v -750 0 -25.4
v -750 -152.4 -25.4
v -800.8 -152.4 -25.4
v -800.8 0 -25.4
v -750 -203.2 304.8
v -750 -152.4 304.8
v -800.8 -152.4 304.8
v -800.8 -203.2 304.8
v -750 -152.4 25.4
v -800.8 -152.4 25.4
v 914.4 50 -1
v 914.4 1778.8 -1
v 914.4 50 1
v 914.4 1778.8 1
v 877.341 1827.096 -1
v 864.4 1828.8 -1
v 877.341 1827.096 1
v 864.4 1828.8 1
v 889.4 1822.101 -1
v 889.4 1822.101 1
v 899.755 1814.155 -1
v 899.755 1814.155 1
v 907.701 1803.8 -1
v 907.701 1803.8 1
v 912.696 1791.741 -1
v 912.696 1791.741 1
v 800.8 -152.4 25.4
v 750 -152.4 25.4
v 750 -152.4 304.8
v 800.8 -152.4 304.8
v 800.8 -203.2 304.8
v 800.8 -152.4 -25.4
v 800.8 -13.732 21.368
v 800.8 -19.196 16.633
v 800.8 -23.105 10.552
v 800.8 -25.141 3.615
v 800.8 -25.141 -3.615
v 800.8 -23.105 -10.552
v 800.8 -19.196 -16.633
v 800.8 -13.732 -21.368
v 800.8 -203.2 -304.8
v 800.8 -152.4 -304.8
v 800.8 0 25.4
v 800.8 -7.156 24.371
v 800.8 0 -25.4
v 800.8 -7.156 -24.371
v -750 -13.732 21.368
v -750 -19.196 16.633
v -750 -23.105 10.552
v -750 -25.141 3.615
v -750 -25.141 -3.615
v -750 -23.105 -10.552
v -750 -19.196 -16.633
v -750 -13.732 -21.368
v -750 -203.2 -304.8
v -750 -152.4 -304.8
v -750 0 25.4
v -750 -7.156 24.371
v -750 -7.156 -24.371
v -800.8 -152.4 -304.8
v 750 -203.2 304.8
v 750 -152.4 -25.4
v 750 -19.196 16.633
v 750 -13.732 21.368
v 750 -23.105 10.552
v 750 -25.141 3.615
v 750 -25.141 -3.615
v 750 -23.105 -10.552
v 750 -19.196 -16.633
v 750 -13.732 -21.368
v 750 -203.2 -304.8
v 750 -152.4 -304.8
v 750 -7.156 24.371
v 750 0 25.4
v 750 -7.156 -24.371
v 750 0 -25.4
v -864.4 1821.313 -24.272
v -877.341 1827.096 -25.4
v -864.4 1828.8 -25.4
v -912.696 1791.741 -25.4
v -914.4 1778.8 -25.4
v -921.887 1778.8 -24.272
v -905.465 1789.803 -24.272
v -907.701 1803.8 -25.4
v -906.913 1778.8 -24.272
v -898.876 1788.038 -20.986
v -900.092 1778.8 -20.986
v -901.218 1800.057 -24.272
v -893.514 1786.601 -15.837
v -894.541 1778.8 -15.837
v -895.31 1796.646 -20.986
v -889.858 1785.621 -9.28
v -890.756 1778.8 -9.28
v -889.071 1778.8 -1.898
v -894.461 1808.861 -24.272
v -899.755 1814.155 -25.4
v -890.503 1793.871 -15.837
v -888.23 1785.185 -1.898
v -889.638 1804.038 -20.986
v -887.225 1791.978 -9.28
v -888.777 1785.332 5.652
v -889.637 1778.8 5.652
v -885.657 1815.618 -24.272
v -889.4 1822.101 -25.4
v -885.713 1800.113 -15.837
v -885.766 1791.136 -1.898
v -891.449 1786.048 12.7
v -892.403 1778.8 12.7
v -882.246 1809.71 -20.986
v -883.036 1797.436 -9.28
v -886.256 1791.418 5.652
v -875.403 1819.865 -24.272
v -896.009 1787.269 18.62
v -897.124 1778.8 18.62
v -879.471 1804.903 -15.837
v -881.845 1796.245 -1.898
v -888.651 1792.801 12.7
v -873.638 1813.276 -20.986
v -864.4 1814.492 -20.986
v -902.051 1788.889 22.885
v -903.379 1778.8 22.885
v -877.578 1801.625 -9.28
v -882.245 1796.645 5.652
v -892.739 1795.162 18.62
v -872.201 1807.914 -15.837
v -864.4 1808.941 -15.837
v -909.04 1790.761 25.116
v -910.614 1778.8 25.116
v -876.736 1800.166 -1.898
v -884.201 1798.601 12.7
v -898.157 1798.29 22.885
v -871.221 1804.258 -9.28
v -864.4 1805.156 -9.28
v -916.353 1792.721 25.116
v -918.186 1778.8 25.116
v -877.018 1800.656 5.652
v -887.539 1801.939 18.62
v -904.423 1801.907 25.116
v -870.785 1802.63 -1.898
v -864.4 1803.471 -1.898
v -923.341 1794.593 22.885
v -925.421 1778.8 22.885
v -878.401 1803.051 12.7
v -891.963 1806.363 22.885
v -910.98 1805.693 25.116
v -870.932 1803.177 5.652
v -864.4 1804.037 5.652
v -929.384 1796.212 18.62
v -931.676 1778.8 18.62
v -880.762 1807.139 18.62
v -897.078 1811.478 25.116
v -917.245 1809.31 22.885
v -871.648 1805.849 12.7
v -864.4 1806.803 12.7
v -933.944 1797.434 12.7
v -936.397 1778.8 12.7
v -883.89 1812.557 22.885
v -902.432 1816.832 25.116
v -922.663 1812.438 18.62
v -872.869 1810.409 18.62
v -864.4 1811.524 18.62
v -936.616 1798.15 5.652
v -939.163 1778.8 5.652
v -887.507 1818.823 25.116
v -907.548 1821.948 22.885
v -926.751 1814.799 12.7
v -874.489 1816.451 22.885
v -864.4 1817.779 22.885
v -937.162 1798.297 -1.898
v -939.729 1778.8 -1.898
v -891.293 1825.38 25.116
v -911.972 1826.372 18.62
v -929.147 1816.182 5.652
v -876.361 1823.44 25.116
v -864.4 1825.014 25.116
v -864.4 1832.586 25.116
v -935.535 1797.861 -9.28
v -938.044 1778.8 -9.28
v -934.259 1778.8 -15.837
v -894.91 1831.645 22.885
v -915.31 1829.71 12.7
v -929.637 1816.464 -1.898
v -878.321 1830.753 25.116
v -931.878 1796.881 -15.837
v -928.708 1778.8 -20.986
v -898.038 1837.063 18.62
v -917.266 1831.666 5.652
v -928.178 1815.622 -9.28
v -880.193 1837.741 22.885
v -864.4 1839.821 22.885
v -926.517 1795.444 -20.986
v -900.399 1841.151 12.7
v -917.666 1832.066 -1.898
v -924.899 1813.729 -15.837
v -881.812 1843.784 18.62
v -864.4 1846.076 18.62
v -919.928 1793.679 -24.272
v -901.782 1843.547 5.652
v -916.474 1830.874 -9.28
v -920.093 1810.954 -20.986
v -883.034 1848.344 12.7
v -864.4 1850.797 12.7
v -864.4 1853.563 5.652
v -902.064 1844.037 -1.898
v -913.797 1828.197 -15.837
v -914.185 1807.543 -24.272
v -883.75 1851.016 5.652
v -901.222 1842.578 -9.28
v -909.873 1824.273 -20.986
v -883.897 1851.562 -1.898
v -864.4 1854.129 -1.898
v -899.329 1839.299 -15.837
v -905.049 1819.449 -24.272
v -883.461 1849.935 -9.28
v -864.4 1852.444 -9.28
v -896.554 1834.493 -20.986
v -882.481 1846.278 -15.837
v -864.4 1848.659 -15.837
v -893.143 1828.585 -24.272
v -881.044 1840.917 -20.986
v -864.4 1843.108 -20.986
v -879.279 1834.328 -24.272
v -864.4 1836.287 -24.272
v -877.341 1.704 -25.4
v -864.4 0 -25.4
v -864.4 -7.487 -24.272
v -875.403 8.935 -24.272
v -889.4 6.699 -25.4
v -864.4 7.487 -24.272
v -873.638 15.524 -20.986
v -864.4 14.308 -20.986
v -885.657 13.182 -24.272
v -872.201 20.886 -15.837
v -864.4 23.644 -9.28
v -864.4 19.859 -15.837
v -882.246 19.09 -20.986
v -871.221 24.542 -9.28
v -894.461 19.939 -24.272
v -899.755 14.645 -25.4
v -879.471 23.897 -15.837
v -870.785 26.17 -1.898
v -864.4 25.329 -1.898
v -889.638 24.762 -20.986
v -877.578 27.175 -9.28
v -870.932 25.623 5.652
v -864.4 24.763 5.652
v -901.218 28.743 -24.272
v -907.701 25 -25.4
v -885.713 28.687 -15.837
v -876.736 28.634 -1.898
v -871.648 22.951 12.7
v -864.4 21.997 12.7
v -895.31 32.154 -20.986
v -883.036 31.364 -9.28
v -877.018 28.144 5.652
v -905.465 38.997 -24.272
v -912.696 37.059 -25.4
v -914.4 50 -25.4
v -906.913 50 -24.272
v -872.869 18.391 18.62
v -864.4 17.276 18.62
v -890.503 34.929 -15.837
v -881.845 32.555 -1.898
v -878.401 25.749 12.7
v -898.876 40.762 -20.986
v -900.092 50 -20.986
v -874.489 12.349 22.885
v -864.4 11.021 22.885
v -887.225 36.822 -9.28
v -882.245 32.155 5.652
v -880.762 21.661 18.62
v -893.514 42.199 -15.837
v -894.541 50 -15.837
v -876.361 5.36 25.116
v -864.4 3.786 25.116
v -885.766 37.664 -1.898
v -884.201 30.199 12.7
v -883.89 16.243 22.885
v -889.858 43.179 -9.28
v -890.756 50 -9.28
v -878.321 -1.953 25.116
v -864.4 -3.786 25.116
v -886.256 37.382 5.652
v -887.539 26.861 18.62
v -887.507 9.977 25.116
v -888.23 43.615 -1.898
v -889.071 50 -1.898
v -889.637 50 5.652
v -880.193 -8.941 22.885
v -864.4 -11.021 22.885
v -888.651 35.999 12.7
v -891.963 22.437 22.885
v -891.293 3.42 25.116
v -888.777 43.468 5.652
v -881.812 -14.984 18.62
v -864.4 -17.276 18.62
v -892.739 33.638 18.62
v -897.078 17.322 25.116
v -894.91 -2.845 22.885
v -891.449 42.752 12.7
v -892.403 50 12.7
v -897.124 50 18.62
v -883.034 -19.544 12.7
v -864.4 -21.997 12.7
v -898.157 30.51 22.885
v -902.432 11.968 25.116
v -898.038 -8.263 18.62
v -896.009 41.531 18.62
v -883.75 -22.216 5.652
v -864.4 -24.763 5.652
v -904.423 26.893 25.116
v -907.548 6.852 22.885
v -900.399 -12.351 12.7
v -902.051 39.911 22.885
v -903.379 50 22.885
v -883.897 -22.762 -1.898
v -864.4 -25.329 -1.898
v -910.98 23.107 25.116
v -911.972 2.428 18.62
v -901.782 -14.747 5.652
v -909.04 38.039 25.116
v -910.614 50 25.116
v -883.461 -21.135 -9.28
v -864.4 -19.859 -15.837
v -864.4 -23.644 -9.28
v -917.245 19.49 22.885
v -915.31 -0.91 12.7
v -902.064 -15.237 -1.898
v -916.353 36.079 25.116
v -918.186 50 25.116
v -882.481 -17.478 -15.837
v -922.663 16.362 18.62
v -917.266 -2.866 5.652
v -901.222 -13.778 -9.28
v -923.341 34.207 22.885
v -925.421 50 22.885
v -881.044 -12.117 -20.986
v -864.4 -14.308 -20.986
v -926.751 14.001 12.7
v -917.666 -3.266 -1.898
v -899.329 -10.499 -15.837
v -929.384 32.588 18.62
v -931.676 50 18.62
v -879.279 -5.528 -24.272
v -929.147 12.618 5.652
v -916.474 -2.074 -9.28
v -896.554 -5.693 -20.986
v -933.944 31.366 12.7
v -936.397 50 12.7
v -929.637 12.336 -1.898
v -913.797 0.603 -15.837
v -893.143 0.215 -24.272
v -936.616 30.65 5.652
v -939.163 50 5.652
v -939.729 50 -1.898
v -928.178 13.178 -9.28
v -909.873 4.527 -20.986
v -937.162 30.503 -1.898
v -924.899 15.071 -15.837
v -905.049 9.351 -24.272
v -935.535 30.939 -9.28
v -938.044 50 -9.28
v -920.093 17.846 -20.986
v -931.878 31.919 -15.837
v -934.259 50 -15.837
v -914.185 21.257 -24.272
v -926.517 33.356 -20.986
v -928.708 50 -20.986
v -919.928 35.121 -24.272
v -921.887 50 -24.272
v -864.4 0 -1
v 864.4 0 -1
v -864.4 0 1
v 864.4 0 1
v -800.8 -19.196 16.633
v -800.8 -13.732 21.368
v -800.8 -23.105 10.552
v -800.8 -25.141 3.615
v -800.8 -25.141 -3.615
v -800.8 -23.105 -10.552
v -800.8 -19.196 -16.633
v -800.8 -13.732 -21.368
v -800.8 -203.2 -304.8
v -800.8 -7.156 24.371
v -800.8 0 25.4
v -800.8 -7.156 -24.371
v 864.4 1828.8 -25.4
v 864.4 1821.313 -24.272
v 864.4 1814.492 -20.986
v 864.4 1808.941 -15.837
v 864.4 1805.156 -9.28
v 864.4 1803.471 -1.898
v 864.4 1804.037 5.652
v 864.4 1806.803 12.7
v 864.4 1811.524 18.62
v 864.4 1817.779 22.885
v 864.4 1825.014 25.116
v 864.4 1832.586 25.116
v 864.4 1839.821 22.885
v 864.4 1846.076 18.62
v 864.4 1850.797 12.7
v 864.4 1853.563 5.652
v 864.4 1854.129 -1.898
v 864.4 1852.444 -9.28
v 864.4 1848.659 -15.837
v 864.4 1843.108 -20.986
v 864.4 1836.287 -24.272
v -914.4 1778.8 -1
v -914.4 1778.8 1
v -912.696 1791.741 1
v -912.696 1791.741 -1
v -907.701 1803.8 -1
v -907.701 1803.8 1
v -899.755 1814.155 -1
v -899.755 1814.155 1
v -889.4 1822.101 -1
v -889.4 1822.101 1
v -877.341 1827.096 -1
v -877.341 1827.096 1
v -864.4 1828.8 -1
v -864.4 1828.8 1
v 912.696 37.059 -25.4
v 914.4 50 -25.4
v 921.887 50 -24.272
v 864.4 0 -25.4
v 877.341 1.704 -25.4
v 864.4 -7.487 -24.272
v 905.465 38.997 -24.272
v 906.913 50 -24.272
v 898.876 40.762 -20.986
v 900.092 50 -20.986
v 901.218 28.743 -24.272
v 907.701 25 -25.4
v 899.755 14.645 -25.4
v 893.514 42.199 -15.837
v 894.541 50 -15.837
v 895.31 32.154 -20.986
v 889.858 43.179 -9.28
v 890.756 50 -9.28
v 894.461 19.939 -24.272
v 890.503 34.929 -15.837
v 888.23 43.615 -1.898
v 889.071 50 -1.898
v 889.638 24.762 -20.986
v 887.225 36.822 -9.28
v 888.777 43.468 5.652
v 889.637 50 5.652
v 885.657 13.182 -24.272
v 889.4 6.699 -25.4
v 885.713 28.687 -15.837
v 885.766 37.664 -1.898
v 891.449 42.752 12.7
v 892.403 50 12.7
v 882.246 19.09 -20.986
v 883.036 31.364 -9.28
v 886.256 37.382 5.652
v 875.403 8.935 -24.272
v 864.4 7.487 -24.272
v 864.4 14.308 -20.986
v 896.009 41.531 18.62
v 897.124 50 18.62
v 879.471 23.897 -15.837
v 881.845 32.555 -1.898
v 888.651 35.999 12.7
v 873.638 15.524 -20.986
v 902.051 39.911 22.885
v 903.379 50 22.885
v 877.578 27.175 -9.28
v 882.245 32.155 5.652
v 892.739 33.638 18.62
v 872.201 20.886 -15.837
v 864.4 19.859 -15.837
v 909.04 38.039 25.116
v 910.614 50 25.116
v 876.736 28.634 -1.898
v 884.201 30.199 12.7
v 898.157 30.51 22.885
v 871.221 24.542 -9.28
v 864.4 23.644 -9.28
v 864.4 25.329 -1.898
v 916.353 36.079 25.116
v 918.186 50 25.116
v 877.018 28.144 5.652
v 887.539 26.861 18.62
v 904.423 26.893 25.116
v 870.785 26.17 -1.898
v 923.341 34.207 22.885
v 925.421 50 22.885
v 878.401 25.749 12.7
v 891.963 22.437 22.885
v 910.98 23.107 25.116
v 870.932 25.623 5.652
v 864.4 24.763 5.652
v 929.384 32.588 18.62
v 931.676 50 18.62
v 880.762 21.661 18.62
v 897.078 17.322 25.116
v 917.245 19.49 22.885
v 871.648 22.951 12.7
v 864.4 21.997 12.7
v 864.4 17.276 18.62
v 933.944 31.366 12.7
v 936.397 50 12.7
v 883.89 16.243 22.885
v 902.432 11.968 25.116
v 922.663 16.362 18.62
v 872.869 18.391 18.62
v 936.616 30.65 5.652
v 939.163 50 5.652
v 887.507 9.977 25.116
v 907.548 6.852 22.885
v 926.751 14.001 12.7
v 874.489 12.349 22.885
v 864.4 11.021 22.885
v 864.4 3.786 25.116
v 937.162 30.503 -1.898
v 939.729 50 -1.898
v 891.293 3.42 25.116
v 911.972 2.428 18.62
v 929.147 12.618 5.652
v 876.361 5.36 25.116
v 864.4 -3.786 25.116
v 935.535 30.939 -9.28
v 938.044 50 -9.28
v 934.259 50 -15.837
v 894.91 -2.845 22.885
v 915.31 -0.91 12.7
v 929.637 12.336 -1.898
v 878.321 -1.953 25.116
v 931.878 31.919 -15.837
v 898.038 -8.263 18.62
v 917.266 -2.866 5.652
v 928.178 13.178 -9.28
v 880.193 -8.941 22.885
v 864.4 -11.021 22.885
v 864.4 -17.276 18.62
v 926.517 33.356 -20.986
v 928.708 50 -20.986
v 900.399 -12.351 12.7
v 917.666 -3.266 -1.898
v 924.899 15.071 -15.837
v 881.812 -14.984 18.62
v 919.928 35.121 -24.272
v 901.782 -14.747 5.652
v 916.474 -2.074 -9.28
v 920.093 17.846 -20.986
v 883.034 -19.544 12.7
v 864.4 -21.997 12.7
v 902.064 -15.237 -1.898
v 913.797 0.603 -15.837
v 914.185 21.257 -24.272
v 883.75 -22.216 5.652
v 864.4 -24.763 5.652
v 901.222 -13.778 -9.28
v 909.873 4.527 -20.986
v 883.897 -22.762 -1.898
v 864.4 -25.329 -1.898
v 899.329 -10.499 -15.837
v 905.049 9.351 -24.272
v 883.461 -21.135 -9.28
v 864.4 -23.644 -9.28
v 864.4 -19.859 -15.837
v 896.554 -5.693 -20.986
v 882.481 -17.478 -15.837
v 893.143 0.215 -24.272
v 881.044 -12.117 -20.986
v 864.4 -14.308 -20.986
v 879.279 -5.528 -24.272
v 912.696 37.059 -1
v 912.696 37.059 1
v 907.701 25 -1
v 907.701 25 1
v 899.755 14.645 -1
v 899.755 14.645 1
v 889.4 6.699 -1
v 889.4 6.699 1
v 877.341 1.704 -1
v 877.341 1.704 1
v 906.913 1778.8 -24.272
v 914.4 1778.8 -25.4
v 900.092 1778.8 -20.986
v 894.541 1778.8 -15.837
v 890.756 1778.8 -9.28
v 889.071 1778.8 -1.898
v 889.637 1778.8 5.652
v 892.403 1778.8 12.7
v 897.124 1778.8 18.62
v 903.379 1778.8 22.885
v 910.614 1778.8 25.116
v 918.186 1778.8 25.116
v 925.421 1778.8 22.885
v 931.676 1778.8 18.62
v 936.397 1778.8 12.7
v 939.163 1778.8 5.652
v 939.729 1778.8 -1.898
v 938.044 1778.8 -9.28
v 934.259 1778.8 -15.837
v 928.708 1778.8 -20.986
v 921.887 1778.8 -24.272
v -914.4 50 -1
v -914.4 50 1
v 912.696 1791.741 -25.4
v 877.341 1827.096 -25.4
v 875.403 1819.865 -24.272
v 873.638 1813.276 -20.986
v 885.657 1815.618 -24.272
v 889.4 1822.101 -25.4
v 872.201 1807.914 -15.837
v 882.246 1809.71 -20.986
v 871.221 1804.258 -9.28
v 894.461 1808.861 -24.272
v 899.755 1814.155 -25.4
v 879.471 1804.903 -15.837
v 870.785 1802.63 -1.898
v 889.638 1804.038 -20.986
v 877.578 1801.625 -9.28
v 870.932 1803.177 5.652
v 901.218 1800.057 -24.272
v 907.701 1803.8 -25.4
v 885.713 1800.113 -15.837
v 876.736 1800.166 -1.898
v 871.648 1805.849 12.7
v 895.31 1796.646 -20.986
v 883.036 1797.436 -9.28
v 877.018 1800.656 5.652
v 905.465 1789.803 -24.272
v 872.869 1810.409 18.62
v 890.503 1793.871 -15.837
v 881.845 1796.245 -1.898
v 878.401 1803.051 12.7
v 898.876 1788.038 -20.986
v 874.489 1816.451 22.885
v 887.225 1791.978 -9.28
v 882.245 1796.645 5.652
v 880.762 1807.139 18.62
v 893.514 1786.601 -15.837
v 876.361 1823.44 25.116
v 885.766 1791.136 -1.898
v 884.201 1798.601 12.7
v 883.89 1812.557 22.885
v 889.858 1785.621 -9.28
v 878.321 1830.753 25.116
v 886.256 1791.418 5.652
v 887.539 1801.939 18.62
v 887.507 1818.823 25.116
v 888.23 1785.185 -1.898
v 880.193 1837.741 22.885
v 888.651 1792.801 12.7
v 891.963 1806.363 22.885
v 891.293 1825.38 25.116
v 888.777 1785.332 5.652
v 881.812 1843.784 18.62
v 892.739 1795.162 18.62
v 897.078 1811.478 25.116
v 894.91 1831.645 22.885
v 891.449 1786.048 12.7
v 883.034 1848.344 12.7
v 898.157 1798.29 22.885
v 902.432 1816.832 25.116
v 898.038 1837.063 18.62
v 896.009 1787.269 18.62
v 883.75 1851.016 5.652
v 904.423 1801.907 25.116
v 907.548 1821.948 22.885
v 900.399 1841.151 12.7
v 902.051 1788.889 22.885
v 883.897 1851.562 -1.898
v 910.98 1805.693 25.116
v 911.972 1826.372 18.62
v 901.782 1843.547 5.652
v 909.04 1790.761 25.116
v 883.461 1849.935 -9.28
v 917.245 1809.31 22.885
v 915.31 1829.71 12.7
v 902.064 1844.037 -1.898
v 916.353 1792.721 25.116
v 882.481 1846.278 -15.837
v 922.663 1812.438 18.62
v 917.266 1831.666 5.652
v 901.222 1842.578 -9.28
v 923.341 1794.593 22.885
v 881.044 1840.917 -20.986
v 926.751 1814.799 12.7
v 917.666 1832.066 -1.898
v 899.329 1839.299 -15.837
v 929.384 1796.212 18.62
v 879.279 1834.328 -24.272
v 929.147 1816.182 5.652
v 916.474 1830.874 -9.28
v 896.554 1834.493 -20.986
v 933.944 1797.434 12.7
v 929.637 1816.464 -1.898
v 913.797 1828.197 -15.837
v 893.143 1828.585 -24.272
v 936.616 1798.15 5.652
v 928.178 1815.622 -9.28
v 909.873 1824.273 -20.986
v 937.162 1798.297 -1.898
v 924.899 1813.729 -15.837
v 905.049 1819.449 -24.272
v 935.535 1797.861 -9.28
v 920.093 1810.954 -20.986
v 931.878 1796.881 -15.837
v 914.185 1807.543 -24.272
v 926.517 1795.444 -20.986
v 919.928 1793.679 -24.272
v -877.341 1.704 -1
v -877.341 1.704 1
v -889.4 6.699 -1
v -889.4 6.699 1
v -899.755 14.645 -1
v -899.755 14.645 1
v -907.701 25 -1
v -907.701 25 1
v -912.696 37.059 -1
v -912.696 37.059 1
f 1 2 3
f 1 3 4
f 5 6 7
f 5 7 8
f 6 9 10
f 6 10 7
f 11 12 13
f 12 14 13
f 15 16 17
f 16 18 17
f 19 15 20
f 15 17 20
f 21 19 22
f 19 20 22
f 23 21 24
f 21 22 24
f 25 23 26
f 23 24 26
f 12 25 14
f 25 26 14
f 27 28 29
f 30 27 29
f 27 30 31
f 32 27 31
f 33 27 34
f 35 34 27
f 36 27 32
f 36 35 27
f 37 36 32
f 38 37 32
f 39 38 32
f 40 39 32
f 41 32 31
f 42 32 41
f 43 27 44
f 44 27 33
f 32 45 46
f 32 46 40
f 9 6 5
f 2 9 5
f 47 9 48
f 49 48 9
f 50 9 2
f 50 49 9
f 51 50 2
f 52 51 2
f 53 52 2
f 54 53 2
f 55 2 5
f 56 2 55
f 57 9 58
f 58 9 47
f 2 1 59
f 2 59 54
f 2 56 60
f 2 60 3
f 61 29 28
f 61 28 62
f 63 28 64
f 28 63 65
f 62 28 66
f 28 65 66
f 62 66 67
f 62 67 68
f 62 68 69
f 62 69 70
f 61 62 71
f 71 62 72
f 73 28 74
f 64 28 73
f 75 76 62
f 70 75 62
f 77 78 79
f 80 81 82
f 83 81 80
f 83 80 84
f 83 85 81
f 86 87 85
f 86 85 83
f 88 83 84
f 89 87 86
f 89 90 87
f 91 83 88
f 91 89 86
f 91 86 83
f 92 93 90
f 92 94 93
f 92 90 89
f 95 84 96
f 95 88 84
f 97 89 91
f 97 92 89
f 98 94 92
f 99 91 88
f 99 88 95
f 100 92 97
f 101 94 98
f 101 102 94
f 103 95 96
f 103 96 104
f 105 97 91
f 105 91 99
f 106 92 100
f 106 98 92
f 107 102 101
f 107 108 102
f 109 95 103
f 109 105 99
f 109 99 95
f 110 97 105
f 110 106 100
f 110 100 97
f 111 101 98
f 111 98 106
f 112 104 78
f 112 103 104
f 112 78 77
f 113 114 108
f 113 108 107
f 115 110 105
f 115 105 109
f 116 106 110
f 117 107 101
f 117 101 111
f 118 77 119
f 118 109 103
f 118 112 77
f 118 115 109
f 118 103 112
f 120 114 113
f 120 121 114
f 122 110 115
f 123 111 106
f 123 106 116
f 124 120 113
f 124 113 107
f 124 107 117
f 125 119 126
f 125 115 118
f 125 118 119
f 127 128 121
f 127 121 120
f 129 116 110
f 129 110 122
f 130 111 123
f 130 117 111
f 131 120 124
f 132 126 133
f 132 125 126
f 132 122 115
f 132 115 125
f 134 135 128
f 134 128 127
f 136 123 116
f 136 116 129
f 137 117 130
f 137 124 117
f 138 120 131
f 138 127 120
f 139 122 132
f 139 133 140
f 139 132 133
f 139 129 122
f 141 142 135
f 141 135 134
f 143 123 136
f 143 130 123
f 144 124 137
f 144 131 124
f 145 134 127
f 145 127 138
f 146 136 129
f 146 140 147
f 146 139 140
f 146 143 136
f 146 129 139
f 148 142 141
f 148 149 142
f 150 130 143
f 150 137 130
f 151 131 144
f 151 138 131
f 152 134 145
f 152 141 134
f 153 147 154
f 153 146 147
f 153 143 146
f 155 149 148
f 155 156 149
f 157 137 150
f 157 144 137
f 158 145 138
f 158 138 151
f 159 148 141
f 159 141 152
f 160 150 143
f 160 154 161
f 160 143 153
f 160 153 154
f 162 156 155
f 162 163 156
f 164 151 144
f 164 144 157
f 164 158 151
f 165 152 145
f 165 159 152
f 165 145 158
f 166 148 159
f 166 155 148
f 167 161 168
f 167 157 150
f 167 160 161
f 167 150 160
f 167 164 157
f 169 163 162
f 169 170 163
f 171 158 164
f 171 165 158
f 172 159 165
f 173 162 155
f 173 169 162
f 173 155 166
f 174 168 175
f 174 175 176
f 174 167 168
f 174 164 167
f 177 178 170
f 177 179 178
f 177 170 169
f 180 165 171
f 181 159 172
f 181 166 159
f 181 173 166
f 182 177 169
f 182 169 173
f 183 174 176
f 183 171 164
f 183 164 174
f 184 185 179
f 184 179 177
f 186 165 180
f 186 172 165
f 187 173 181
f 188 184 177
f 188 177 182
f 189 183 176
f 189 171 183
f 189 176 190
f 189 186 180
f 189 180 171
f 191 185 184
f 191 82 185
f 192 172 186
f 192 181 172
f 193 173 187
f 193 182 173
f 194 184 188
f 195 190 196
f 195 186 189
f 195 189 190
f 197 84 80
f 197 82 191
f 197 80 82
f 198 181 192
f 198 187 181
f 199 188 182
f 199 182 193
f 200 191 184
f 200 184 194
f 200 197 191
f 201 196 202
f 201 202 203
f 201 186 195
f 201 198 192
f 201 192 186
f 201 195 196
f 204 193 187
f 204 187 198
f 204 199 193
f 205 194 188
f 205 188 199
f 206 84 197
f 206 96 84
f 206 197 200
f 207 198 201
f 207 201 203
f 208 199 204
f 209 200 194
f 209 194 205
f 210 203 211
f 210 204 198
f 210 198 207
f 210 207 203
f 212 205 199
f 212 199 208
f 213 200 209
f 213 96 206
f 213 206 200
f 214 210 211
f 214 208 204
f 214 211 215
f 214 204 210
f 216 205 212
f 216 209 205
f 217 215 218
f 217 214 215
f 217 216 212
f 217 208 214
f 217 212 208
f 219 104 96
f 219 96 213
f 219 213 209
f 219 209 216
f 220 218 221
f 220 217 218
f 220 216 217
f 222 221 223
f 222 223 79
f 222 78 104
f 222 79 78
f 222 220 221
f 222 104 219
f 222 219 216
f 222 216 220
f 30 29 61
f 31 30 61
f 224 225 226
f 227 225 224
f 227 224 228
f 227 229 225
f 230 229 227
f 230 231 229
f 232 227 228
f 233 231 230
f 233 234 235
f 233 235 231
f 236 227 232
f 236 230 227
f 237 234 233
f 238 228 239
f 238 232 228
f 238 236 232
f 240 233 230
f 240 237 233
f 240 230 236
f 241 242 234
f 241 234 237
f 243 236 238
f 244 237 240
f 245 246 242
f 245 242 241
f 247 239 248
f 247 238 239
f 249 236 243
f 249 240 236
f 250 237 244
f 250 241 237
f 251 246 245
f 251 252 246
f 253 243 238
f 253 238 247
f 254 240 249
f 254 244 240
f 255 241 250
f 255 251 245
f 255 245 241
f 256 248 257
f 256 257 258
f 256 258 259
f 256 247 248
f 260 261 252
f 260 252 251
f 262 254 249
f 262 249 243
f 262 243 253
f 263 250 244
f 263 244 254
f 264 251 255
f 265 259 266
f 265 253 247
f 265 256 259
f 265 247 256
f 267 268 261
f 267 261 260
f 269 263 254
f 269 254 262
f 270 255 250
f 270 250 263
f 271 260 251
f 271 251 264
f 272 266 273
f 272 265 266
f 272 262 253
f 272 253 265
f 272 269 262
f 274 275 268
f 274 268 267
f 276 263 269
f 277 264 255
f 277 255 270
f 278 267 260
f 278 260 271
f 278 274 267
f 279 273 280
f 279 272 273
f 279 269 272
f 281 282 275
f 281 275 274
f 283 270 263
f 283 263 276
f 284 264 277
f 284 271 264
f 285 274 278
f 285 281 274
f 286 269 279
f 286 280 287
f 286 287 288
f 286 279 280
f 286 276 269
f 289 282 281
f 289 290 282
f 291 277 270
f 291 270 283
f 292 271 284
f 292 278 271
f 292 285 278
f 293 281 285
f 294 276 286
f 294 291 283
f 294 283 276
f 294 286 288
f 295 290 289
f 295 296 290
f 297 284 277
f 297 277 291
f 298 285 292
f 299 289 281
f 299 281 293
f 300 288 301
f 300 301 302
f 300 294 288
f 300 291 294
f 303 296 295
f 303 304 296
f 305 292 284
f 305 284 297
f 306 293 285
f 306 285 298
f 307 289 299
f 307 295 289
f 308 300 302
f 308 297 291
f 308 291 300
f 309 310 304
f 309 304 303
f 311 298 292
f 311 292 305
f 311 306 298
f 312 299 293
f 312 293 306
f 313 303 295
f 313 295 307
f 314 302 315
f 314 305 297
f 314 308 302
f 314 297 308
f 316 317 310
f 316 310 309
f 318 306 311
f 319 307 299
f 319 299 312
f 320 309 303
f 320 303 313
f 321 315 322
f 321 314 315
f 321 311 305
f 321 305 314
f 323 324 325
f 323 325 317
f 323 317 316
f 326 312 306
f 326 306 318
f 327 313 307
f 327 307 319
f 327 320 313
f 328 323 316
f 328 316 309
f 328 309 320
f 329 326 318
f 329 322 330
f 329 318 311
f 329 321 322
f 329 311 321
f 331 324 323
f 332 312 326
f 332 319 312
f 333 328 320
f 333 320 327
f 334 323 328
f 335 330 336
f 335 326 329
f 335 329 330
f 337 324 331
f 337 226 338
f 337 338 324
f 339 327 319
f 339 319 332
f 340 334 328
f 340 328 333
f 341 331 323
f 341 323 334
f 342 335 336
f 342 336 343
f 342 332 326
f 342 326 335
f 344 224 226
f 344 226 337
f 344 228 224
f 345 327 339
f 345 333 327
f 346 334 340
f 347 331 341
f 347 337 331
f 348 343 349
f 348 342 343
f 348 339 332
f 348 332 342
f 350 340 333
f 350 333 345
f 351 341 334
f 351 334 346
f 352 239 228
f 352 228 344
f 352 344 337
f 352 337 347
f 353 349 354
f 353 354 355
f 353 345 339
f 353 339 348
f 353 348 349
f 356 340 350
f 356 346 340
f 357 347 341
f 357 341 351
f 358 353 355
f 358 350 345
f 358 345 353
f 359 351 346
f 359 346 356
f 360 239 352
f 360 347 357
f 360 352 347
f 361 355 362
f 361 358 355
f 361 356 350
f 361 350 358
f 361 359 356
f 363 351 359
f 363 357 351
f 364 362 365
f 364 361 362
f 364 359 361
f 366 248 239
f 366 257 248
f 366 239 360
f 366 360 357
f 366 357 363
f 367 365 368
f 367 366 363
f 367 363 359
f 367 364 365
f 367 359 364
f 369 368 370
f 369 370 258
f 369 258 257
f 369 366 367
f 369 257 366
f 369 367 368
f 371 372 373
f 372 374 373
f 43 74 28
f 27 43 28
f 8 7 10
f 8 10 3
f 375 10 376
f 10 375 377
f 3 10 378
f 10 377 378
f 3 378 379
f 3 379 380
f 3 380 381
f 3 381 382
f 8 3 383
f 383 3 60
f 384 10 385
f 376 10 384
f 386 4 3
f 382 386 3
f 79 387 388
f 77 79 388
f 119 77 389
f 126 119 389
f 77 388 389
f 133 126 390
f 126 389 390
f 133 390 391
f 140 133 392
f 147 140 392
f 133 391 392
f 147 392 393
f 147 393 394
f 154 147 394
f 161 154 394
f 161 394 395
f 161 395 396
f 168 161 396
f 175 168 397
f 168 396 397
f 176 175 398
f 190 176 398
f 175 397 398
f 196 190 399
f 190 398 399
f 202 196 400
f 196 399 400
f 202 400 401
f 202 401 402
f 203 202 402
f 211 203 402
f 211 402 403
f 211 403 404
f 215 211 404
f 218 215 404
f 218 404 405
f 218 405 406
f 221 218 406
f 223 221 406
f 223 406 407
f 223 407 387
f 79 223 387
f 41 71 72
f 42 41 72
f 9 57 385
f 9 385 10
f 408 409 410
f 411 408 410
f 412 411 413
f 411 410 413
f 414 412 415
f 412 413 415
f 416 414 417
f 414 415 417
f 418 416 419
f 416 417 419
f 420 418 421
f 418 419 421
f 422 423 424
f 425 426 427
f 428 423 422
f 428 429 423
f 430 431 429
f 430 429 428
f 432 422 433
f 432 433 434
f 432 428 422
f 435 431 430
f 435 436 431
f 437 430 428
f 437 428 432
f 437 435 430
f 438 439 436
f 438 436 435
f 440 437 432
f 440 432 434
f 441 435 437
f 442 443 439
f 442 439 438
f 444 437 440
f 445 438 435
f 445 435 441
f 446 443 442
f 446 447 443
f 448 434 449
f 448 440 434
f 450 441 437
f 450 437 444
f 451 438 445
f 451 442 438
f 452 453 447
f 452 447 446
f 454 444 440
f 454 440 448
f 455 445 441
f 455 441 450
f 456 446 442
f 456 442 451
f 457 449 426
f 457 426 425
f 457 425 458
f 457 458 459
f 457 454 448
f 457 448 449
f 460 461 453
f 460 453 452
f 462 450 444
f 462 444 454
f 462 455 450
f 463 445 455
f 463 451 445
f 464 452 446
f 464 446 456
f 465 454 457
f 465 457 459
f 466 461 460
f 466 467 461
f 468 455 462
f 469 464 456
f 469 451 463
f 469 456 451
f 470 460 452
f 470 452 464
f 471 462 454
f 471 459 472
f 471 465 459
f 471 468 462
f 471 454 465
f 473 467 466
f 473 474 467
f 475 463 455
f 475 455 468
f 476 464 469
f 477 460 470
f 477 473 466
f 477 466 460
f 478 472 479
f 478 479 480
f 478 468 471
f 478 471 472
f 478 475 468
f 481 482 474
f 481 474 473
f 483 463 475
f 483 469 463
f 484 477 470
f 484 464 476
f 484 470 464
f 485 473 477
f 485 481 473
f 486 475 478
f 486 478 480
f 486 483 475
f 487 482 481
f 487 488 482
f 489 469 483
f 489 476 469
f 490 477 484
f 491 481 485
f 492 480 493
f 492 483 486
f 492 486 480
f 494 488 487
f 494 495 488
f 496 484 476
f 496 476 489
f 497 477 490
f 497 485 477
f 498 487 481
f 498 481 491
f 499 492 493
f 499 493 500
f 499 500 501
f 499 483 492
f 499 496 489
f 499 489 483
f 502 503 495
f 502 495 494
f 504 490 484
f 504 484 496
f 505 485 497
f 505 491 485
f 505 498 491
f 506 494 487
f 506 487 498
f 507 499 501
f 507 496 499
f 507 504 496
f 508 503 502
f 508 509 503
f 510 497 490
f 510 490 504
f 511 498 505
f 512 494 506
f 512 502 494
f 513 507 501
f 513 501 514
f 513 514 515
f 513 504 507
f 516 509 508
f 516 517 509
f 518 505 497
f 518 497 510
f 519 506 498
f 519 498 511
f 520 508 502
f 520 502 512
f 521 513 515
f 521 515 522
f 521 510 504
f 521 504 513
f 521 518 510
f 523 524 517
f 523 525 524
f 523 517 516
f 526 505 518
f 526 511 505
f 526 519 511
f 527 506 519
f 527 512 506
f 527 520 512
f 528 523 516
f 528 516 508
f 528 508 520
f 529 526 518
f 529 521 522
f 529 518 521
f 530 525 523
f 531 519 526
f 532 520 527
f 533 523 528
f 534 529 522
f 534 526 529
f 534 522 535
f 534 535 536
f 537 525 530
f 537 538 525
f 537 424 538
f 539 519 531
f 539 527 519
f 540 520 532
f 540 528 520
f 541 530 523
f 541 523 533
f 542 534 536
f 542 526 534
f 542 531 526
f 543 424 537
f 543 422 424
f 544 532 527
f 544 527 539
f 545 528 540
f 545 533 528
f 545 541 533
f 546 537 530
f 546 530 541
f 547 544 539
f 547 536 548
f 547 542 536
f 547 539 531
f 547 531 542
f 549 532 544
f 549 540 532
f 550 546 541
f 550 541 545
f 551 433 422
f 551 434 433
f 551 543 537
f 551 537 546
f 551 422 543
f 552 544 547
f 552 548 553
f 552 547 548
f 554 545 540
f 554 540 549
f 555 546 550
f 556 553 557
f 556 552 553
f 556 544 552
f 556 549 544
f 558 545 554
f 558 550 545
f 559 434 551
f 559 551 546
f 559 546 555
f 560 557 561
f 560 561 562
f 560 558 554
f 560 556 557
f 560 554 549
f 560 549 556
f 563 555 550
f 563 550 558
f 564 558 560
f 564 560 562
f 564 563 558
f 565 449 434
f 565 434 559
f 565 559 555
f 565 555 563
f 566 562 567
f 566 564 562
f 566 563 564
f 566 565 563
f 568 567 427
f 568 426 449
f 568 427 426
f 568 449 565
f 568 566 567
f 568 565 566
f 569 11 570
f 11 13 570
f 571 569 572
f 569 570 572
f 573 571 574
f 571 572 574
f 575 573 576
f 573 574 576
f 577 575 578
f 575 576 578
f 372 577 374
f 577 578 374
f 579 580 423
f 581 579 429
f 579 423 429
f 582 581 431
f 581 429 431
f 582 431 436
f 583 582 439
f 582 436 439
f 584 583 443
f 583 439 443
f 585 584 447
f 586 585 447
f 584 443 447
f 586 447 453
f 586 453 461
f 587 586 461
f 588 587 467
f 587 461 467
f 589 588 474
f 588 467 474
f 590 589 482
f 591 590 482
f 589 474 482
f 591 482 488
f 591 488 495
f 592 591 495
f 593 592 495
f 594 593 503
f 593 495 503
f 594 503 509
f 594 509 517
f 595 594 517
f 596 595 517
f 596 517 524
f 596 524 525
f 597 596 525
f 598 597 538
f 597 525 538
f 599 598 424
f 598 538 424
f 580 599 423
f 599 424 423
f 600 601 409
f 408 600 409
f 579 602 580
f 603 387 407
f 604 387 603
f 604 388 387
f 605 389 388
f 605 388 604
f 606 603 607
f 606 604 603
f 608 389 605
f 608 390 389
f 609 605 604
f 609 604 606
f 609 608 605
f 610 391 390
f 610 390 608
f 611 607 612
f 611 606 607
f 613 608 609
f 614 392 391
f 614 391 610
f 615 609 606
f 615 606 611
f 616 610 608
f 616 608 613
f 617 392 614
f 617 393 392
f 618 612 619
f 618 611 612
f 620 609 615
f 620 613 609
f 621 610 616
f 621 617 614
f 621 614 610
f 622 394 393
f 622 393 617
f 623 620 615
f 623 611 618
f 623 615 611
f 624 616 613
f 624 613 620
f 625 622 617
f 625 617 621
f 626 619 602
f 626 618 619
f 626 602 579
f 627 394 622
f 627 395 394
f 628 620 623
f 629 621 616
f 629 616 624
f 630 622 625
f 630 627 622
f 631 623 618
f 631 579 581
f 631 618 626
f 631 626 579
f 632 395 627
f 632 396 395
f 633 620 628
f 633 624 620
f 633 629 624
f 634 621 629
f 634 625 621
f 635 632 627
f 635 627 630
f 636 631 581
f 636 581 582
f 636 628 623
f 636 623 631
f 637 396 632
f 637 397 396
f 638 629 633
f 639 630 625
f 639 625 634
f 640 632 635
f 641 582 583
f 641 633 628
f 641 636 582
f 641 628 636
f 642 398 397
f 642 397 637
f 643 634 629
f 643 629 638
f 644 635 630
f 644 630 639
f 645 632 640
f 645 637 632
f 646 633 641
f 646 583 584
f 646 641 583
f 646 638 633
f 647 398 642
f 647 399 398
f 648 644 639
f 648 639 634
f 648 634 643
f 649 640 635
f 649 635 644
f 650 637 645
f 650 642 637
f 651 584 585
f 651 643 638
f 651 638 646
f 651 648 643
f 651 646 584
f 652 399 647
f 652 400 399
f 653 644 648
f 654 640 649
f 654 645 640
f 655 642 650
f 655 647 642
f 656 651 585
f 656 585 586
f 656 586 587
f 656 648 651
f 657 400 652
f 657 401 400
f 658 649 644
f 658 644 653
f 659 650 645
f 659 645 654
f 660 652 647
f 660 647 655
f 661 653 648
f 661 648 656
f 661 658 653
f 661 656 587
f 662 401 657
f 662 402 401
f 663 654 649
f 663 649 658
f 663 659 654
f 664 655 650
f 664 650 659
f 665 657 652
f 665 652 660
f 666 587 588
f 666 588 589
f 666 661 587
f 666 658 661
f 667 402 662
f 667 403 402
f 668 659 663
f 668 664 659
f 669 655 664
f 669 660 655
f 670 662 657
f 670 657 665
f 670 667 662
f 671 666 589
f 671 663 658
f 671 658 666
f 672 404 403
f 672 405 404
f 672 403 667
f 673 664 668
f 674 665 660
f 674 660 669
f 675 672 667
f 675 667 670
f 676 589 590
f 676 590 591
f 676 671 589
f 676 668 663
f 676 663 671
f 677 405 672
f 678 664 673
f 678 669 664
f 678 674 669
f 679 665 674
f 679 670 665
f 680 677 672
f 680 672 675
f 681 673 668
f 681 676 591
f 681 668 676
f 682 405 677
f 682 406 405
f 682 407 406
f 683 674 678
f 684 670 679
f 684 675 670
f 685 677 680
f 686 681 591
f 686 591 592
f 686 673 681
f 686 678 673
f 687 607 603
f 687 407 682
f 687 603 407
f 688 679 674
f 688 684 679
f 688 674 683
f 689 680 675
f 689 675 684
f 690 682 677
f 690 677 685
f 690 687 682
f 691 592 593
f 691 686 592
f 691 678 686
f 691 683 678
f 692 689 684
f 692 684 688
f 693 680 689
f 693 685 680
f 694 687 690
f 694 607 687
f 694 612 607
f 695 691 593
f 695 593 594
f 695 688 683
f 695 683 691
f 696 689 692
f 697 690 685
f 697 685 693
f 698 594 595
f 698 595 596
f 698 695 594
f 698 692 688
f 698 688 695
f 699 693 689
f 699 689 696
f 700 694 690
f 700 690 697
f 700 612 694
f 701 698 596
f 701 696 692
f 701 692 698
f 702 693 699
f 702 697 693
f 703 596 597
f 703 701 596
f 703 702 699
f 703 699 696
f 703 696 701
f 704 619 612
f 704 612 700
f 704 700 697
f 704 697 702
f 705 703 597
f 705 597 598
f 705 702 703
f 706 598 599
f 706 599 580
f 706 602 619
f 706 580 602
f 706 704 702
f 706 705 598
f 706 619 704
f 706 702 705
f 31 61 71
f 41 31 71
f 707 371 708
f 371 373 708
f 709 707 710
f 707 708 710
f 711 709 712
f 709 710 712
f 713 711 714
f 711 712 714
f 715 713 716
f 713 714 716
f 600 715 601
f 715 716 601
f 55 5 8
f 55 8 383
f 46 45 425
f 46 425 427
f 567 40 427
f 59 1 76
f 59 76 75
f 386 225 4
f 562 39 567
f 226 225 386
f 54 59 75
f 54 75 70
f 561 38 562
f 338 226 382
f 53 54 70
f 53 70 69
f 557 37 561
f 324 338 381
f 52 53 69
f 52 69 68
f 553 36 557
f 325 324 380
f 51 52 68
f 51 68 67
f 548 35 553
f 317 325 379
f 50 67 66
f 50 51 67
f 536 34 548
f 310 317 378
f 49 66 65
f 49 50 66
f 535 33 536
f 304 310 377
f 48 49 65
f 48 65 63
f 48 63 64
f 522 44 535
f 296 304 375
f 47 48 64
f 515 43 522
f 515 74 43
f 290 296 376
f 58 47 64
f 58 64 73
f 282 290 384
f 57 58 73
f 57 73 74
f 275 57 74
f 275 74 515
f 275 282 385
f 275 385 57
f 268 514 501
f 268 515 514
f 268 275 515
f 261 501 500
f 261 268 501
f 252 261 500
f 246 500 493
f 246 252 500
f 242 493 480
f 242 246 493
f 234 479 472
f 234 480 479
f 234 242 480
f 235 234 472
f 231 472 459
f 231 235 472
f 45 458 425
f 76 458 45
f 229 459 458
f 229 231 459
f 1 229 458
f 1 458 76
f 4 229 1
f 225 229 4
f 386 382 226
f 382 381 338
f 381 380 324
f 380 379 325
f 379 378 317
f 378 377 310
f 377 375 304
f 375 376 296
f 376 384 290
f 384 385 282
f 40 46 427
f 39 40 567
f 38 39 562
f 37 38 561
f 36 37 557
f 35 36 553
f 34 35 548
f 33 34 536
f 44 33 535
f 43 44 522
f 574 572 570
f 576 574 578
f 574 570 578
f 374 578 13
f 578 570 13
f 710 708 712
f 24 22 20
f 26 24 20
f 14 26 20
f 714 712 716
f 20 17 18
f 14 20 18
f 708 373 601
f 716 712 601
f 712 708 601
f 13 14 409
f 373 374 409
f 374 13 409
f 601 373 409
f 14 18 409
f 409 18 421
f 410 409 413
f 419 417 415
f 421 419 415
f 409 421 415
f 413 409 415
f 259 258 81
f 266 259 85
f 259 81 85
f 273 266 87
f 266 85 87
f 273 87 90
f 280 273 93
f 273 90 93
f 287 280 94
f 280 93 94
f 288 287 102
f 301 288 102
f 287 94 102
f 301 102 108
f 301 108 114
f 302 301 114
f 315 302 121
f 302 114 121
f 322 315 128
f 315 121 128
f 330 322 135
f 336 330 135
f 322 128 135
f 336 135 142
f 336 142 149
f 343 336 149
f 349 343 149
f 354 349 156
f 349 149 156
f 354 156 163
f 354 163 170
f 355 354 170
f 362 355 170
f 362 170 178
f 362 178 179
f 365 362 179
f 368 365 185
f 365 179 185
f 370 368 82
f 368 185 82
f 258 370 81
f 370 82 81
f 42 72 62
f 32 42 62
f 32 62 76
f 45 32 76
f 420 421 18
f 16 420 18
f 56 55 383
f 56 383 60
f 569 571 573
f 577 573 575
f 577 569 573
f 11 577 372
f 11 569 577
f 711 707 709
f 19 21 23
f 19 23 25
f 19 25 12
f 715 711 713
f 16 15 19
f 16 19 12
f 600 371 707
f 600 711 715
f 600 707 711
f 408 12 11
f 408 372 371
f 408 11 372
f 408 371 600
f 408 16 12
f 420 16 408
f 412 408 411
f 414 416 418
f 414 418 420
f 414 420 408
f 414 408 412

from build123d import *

# Parameters (mm, degrees)
SKETCH2_R           = 25.4
BOSS_EXTRUDE1_START = 750
BOSS_EXTRUDE1_DEPTH = 50.8
BOSS_EXTRUDE2_DEPTH = 1


with BuildPart() as part:
    # Sweep1: sweep along a path in Sketch1
    with BuildLine(Plane.XY) as sweep1_path:
        Line((-864.4, 1828.8), (864.4, 1828.8))
        ThreePointArc((864.4, 1828.8), (899.755339059, 1814.155339059), (914.4, 1778.8))
        Line((914.4, 1778.8), (914.4, 50))
        ThreePointArc((914.4, 50), (899.755339059, 14.644660941), (864.4, 0))
        Line((864.4, 0), (-864.4, 0))
        ThreePointArc((-864.4, 0), (-899.755339059, 14.644660941), (-914.4, 50))
        Line((-914.4, 50), (-914.4, 1778.8))
        ThreePointArc((-914.4, 1778.8), (-899.755339059, 1814.155339059), (-864.4, 1828.8))
    # Sketch2 → Sweep1 (sweep)
    with BuildSketch(Plane(origin=(0, 0, 0), x_dir=(0, 0, -1), z_dir=(1, 0, 0))):
        Circle(SKETCH2_R)
    sweep(path=sweep1_path.line)

    # Sketch3 → Boss-Extrude1 (add)
    with BuildSketch(Plane(origin=(0, 0, 0), x_dir=(0, 0, -1), z_dir=(1, 0, 0)).offset(BOSS_EXTRUDE1_START)):
        Polygon((-25.4, 0), (-25.4, -152.4), (-304.8, -152.4), (-304.8, -203.2), (304.8, -203.2), (304.8, -152.4), (25.4, -152.4), (25.4, 0), align=None)
    boss_extrude1 = extrude(amount=BOSS_EXTRUDE1_DEPTH)

    # Mirror1: Boss-Extrude1 across plane
    add(boss_extrude1.mirror(Plane(origin=(0, 0, 0), x_dir=(0, 0, 1), z_dir=(1, 0, 0))))


with BuildPart() as body_2:
    # Sketch1<2> → Boss-Extrude2 (new, symmetric)
    with BuildSketch(Plane.XY):
        with BuildLine():
            Line((-864.4, 1828.8), (864.4, 1828.8))
            ThreePointArc((864.4, 1828.8), (899.755339059, 1814.155339059), (914.4, 1778.8))
            Line((914.4, 1778.8), (914.4, 50))
            ThreePointArc((914.4, 50), (899.755339059, 14.644660941), (864.4, 0))
            Line((864.4, 0), (-864.4, 0))
            ThreePointArc((-864.4, 0), (-899.755339059, 14.644660941), (-914.4, 50))
            Line((-914.4, 50), (-914.4, 1778.8))
            ThreePointArc((-914.4, 1778.8), (-899.755339059, 1814.155339059), (-864.4, 1828.8))
        make_face()
    extrude(amount=BOSS_EXTRUDE2_DEPTH, both=True)


solid = Compound([part.part, body_2.part])
